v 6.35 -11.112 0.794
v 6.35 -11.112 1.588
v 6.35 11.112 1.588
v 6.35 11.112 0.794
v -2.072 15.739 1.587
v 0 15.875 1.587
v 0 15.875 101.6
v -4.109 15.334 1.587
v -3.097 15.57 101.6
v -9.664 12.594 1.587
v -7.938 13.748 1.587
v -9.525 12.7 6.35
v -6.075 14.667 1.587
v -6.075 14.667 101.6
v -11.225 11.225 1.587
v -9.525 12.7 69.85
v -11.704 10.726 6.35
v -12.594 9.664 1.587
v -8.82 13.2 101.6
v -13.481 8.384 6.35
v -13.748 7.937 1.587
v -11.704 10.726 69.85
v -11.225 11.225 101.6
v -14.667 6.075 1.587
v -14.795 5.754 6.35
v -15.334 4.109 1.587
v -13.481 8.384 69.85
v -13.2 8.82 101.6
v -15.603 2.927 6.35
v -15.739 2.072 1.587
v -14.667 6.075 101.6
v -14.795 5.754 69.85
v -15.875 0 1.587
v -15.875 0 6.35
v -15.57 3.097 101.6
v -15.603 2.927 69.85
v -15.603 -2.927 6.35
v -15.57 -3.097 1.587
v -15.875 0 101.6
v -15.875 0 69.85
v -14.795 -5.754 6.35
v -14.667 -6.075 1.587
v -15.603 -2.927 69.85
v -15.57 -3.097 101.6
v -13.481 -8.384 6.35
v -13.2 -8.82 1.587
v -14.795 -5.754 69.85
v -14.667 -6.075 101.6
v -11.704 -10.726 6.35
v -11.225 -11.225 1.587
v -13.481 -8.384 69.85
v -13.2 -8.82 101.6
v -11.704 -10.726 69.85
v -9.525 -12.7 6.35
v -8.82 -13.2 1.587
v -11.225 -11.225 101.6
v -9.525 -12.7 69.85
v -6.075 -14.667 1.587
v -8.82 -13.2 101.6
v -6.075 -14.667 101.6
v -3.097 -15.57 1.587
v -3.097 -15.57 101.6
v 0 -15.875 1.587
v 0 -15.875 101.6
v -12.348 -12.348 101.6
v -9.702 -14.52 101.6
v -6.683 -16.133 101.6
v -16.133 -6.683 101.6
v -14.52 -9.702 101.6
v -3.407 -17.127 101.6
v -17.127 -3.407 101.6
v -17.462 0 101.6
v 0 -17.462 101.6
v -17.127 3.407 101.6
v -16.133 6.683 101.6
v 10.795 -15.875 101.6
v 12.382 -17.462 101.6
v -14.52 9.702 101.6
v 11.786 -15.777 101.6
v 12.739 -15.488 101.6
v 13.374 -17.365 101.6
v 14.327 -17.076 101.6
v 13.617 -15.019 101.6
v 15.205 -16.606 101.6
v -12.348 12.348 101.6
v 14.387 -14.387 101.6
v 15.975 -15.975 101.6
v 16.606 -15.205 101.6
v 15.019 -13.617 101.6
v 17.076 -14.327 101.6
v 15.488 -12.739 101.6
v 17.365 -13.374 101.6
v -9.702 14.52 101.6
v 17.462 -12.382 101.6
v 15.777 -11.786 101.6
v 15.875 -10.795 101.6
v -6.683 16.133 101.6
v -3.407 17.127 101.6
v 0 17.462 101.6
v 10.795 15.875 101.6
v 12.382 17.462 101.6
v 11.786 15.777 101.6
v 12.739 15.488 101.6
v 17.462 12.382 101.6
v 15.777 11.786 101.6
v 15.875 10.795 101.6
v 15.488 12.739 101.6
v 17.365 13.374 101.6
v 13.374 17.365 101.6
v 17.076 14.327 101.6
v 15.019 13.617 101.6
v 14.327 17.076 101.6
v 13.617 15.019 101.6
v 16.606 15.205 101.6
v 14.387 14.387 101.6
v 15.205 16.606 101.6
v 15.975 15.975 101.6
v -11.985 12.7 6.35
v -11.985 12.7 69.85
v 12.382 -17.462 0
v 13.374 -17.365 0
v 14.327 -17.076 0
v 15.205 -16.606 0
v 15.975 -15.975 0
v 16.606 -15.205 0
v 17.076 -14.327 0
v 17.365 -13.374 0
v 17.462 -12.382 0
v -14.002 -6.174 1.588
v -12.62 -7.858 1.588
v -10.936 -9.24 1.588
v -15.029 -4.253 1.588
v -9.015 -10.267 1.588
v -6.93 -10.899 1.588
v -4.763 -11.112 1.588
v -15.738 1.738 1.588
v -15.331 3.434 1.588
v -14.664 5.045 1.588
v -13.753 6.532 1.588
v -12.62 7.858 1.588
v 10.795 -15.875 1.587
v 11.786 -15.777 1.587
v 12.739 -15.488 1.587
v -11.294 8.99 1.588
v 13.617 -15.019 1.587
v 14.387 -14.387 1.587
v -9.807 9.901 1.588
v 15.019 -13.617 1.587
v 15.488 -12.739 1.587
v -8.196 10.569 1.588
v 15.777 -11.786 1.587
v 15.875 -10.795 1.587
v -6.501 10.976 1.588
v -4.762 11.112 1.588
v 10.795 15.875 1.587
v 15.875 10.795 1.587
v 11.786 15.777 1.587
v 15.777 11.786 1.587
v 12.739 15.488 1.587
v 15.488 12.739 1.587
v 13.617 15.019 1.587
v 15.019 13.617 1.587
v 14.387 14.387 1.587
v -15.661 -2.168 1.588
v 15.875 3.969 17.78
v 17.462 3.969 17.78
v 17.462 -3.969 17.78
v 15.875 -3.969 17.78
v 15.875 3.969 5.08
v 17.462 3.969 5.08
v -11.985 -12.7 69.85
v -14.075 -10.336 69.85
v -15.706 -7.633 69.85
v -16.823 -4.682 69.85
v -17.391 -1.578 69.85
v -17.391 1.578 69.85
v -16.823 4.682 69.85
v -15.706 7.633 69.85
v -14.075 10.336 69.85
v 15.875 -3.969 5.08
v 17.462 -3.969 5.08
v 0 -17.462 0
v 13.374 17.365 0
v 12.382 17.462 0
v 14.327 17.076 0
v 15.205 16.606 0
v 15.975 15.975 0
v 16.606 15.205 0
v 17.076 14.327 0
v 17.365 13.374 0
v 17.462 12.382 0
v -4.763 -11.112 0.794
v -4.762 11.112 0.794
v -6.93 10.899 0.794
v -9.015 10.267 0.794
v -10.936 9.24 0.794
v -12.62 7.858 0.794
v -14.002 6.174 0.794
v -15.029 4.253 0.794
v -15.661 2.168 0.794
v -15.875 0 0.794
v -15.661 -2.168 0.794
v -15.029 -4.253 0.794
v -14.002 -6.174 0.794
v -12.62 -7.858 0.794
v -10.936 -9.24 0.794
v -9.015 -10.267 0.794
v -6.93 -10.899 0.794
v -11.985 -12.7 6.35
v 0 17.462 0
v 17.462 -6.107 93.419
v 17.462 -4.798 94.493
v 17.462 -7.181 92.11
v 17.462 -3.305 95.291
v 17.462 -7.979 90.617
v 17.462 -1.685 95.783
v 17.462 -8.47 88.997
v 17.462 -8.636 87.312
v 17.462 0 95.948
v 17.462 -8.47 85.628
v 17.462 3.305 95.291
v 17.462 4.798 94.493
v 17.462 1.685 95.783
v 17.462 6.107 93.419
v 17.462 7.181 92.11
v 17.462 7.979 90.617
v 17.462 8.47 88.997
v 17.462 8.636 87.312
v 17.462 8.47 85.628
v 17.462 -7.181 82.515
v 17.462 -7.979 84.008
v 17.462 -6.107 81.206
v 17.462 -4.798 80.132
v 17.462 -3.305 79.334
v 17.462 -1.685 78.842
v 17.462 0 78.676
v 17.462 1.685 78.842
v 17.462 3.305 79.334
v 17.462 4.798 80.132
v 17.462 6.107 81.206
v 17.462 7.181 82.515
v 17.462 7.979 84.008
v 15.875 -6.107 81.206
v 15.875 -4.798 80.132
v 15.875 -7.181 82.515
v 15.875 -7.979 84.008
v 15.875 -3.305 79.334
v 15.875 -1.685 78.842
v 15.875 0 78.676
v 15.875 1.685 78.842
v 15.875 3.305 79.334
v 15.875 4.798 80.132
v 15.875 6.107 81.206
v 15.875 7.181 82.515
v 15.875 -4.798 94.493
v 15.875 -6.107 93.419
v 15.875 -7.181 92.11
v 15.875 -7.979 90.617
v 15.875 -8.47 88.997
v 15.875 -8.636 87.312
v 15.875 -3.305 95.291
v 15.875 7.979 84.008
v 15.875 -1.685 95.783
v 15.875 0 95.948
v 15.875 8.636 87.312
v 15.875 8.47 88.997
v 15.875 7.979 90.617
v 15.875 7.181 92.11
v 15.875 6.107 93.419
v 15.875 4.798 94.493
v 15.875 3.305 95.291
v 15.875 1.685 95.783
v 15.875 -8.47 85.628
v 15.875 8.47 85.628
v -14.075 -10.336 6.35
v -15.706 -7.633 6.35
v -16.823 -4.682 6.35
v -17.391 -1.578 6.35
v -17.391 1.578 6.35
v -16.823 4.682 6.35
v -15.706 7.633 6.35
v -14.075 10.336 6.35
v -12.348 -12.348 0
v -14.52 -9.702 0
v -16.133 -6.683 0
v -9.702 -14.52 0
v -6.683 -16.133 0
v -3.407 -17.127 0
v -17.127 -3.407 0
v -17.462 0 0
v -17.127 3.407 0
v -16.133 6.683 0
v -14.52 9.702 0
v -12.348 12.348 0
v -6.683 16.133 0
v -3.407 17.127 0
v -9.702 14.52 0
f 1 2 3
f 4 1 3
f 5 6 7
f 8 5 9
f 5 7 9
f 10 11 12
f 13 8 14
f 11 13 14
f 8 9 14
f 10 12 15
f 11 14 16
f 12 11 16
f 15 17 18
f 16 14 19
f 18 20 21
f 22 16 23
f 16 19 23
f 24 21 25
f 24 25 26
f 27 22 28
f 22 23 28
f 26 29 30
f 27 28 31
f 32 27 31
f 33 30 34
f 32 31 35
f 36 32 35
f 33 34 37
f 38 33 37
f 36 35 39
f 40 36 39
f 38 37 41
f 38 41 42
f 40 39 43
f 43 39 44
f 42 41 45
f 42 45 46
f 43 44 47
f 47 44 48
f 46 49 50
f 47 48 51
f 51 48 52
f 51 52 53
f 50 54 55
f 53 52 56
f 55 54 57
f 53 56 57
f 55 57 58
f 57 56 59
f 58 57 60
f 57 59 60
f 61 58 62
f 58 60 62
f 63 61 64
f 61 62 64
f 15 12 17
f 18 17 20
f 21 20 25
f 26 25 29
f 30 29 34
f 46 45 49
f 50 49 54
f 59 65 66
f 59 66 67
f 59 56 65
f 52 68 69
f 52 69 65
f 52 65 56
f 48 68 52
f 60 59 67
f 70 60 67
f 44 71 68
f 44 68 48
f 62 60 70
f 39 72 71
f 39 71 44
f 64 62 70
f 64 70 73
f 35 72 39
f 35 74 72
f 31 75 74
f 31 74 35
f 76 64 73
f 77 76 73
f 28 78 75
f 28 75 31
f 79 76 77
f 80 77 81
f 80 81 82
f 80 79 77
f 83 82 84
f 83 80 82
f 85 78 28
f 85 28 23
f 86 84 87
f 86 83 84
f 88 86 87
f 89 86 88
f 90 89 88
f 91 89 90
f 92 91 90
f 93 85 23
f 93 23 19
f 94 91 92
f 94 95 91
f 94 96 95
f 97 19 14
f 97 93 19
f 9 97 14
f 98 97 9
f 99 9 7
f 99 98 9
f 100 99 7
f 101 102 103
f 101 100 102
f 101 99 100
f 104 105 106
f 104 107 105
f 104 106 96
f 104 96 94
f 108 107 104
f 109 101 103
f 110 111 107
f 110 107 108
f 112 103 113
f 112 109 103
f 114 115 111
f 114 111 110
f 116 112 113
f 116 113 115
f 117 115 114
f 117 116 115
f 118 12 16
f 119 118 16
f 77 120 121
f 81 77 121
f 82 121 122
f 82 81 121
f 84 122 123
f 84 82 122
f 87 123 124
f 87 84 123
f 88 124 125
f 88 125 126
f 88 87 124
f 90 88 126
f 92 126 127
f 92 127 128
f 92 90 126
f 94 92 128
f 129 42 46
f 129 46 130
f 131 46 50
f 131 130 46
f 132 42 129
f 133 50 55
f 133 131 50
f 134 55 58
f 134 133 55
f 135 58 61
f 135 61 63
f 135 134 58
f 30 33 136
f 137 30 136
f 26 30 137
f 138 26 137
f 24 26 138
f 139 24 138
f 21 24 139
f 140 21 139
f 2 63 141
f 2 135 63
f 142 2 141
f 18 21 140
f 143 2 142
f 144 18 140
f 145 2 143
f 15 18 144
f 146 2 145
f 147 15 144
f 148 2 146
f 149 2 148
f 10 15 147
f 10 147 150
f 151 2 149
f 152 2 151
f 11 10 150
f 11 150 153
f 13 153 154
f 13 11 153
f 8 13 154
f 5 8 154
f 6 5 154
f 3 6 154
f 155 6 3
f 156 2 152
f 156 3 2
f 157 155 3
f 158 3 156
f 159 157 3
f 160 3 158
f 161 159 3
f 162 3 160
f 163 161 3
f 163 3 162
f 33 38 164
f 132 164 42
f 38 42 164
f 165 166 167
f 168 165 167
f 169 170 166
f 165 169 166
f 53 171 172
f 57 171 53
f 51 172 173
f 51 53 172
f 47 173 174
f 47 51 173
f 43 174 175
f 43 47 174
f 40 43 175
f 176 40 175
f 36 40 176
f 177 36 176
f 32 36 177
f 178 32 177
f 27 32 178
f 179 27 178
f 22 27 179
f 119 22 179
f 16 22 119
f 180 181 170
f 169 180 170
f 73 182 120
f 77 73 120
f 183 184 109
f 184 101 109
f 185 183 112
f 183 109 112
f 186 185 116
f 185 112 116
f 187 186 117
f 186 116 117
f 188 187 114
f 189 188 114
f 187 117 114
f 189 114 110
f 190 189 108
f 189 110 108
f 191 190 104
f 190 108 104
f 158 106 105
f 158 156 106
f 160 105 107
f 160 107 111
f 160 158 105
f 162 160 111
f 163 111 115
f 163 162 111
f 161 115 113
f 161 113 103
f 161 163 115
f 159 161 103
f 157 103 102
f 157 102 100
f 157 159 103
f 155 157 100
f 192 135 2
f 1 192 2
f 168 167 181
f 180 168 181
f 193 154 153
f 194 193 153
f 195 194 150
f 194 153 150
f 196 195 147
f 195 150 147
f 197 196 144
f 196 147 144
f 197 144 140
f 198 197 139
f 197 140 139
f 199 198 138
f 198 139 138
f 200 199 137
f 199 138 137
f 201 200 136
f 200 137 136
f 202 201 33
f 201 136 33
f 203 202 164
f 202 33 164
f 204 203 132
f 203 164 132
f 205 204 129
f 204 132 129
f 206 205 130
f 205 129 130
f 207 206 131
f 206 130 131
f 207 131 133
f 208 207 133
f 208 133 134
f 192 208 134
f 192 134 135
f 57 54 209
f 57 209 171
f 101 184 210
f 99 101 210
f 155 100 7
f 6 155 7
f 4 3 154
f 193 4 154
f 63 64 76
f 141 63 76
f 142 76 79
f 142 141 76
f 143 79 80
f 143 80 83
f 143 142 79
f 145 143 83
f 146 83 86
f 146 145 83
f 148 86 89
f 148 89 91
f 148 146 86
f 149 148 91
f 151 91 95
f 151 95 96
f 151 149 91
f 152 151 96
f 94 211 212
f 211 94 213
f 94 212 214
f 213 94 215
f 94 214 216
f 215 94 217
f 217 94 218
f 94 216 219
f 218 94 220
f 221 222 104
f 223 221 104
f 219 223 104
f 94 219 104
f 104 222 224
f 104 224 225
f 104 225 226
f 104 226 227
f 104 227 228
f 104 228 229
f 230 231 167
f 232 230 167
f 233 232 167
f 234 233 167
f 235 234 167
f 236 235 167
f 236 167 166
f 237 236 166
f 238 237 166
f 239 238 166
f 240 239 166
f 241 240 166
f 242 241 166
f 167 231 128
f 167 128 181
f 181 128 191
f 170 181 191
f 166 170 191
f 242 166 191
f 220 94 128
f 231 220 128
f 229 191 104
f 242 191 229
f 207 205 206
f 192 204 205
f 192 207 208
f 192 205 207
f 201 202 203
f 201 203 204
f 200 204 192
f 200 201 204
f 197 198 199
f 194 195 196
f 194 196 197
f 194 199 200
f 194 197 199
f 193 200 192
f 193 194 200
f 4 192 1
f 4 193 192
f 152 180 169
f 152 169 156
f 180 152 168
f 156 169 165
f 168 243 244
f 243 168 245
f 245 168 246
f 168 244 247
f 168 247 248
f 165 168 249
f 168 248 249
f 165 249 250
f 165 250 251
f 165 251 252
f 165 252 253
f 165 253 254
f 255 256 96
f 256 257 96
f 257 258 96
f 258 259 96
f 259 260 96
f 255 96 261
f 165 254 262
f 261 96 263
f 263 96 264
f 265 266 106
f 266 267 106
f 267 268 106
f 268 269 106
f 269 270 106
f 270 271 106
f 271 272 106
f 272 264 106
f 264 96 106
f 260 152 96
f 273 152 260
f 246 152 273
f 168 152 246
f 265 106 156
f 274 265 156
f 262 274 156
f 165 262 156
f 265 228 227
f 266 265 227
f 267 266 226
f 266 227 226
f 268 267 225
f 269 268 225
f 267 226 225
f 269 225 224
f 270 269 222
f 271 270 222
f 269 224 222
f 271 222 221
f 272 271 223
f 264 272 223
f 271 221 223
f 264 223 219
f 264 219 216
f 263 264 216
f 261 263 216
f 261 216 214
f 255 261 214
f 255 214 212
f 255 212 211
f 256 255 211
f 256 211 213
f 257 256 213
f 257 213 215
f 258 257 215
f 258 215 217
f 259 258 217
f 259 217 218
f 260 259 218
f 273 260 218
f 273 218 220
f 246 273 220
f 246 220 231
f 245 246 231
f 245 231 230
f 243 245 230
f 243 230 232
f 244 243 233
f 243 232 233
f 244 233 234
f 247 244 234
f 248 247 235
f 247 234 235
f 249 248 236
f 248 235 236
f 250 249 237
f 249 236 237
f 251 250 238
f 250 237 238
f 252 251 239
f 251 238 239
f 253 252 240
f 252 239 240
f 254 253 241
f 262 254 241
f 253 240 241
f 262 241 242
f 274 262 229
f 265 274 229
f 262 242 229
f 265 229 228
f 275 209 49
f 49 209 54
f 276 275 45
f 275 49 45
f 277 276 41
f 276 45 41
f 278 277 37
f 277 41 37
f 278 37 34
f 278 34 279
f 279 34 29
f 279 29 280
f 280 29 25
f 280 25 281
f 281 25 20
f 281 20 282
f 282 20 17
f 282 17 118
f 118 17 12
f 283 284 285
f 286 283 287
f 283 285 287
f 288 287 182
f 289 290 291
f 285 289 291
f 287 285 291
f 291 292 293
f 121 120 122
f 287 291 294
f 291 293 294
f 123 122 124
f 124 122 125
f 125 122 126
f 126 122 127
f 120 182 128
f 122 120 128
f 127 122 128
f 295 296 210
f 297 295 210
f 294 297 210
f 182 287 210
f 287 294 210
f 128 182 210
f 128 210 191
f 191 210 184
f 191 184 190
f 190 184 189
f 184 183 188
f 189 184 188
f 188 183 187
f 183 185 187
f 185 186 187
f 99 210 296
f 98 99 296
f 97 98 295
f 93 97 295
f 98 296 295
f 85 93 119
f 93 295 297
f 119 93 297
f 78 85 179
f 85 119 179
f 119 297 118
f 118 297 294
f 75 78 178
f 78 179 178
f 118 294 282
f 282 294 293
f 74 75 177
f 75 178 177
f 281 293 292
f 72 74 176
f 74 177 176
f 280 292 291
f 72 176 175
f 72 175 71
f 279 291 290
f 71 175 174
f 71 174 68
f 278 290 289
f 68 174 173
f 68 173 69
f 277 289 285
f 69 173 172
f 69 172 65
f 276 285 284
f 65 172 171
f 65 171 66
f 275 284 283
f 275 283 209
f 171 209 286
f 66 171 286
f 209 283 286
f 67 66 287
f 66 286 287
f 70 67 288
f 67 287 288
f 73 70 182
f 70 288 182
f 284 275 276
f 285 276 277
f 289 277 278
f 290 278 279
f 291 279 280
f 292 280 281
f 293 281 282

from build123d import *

# Parameters (mm, degrees)
F1_DEPTH  = 101.6
F3_DEPTH  = 100.0125
F4_R      = 5.08
F5_R      = 5.08
F6_R      = 8.636
F7_DEPTH  = 25.4
F9_DEPTH  = 25.4
F10_W     = 25.4
F10_H     = 63.5
F11_DEPTH = 25.4
F13_DEPTH = 0.79375


with BuildPart() as f1:
    # F0 (on Top) → F1 (new body)
    with BuildSketch(Plane.XY):
        with BuildLine():
            ThreePointArc((0, -17.4625), (12.347852, -12.347852), (17.4625, 0))
            ThreePointArc((17.4625, 0), (12.347852, 12.347852), (0, 17.4625))
            ThreePointArc((0, 17.4625), (-17.4625, 0), (0, -17.4625))
        make_face()
        with BuildLine():
            Line((17.4625, -17.4625), (17.4625, 0))
            ThreePointArc((17.4625, 0), (12.347852, -12.347852), (0, -17.4625))
            Line((0, -17.4625), (17.4625, -17.4625))
        make_face()
        with BuildLine():
            ThreePointArc((0, 17.4625), (12.347852, 12.347852), (17.4625, 0))
            Line((17.4625, 0), (17.4625, 17.4625))
            Line((17.4625, 17.4625), (0, 17.4625))
        make_face()
    extrude(amount=F1_DEPTH)

    # F2 (on face) → F3 (cut)
    with BuildSketch(Plane.XY.offset(101.6)):
        with BuildLine():
            ThreePointArc((0, -15.875), (11.22532, -11.22532), (15.875, 0))
            ThreePointArc((15.875, 0), (11.22532, 11.22532), (0, 15.875))
            ThreePointArc((0, 15.875), (-15.875, 0), (0, -15.875))
        make_face()
        with BuildLine():
            Line((15.875, -15.875), (15.875, 0))
            ThreePointArc((15.875, 0), (11.22532, -11.22532), (0, -15.875))
            Line((0, -15.875), (15.875, -15.875))
        make_face()
        with BuildLine():
            ThreePointArc((0, 15.875), (11.22532, 11.22532), (15.875, 0))
            Line((15.875, 0), (15.875, 15.875))
            Line((15.875, 15.875), (0, 15.875))
        make_face()
    extrude(amount=-F3_DEPTH, mode=Mode.SUBTRACT)

    # F4
    f4_edges = [f1.edges().sort_by_distance(p)[0] for p in [
        (17.4625, -17.4625, 50.8),
        (17.4625, 17.4625, 50.8),
    ]]
    fillet(f4_edges, radius=F4_R)

    # F5
    f5_edges = [f1.edges().sort_by_distance(p)[0] for p in [
        (15.875, 15.875, 51.59375),
        (15.875, -15.875, 51.59375),
    ]]
    fillet(f5_edges, radius=F5_R)

    # F6 (on face) → F7 (cut)
    with BuildSketch(Plane.YZ.offset(17.4625)):
        with Locations((0, 87.3125)):
            Circle(F6_R)
    extrude(amount=-F7_DEPTH, mode=Mode.SUBTRACT)

    # F8 (on face) → F9 (cut)
    with BuildSketch(Plane.YZ.offset(17.4625)):
        Polygon((-3.96875, 5.08), (0, 5.08), (3.96875, 5.08), (3.96875, 17.78), (-3.96875, 17.78), align=None)
    extrude(amount=-F9_DEPTH, mode=Mode.SUBTRACT)

    # F10 (on Right) → F11 (cut)
    with BuildSketch(Plane.YZ):
        with Locations((0, 38.1)):
            Rectangle(F10_W, F10_H)
    extrude(amount=-F11_DEPTH, mode=Mode.SUBTRACT)

    # F12 (on face) → F13 (cut)
    with BuildSketch(Plane.XY.offset(1.5875)):
        with BuildLine():
            Line((6.35, 11.1125), (-4.7625, 11.1125))
            ThreePointArc((-4.7625, 11.1125), (-15.875, 0), (-4.7625, -11.1125))
            Line((-4.7625, -11.1125), (6.35, -11.1125))
            Line((6.35, -11.1125), (6.35, 11.1125))
        make_face()
    extrude(amount=-F13_DEPTH, mode=Mode.SUBTRACT)


solid = f1.part
